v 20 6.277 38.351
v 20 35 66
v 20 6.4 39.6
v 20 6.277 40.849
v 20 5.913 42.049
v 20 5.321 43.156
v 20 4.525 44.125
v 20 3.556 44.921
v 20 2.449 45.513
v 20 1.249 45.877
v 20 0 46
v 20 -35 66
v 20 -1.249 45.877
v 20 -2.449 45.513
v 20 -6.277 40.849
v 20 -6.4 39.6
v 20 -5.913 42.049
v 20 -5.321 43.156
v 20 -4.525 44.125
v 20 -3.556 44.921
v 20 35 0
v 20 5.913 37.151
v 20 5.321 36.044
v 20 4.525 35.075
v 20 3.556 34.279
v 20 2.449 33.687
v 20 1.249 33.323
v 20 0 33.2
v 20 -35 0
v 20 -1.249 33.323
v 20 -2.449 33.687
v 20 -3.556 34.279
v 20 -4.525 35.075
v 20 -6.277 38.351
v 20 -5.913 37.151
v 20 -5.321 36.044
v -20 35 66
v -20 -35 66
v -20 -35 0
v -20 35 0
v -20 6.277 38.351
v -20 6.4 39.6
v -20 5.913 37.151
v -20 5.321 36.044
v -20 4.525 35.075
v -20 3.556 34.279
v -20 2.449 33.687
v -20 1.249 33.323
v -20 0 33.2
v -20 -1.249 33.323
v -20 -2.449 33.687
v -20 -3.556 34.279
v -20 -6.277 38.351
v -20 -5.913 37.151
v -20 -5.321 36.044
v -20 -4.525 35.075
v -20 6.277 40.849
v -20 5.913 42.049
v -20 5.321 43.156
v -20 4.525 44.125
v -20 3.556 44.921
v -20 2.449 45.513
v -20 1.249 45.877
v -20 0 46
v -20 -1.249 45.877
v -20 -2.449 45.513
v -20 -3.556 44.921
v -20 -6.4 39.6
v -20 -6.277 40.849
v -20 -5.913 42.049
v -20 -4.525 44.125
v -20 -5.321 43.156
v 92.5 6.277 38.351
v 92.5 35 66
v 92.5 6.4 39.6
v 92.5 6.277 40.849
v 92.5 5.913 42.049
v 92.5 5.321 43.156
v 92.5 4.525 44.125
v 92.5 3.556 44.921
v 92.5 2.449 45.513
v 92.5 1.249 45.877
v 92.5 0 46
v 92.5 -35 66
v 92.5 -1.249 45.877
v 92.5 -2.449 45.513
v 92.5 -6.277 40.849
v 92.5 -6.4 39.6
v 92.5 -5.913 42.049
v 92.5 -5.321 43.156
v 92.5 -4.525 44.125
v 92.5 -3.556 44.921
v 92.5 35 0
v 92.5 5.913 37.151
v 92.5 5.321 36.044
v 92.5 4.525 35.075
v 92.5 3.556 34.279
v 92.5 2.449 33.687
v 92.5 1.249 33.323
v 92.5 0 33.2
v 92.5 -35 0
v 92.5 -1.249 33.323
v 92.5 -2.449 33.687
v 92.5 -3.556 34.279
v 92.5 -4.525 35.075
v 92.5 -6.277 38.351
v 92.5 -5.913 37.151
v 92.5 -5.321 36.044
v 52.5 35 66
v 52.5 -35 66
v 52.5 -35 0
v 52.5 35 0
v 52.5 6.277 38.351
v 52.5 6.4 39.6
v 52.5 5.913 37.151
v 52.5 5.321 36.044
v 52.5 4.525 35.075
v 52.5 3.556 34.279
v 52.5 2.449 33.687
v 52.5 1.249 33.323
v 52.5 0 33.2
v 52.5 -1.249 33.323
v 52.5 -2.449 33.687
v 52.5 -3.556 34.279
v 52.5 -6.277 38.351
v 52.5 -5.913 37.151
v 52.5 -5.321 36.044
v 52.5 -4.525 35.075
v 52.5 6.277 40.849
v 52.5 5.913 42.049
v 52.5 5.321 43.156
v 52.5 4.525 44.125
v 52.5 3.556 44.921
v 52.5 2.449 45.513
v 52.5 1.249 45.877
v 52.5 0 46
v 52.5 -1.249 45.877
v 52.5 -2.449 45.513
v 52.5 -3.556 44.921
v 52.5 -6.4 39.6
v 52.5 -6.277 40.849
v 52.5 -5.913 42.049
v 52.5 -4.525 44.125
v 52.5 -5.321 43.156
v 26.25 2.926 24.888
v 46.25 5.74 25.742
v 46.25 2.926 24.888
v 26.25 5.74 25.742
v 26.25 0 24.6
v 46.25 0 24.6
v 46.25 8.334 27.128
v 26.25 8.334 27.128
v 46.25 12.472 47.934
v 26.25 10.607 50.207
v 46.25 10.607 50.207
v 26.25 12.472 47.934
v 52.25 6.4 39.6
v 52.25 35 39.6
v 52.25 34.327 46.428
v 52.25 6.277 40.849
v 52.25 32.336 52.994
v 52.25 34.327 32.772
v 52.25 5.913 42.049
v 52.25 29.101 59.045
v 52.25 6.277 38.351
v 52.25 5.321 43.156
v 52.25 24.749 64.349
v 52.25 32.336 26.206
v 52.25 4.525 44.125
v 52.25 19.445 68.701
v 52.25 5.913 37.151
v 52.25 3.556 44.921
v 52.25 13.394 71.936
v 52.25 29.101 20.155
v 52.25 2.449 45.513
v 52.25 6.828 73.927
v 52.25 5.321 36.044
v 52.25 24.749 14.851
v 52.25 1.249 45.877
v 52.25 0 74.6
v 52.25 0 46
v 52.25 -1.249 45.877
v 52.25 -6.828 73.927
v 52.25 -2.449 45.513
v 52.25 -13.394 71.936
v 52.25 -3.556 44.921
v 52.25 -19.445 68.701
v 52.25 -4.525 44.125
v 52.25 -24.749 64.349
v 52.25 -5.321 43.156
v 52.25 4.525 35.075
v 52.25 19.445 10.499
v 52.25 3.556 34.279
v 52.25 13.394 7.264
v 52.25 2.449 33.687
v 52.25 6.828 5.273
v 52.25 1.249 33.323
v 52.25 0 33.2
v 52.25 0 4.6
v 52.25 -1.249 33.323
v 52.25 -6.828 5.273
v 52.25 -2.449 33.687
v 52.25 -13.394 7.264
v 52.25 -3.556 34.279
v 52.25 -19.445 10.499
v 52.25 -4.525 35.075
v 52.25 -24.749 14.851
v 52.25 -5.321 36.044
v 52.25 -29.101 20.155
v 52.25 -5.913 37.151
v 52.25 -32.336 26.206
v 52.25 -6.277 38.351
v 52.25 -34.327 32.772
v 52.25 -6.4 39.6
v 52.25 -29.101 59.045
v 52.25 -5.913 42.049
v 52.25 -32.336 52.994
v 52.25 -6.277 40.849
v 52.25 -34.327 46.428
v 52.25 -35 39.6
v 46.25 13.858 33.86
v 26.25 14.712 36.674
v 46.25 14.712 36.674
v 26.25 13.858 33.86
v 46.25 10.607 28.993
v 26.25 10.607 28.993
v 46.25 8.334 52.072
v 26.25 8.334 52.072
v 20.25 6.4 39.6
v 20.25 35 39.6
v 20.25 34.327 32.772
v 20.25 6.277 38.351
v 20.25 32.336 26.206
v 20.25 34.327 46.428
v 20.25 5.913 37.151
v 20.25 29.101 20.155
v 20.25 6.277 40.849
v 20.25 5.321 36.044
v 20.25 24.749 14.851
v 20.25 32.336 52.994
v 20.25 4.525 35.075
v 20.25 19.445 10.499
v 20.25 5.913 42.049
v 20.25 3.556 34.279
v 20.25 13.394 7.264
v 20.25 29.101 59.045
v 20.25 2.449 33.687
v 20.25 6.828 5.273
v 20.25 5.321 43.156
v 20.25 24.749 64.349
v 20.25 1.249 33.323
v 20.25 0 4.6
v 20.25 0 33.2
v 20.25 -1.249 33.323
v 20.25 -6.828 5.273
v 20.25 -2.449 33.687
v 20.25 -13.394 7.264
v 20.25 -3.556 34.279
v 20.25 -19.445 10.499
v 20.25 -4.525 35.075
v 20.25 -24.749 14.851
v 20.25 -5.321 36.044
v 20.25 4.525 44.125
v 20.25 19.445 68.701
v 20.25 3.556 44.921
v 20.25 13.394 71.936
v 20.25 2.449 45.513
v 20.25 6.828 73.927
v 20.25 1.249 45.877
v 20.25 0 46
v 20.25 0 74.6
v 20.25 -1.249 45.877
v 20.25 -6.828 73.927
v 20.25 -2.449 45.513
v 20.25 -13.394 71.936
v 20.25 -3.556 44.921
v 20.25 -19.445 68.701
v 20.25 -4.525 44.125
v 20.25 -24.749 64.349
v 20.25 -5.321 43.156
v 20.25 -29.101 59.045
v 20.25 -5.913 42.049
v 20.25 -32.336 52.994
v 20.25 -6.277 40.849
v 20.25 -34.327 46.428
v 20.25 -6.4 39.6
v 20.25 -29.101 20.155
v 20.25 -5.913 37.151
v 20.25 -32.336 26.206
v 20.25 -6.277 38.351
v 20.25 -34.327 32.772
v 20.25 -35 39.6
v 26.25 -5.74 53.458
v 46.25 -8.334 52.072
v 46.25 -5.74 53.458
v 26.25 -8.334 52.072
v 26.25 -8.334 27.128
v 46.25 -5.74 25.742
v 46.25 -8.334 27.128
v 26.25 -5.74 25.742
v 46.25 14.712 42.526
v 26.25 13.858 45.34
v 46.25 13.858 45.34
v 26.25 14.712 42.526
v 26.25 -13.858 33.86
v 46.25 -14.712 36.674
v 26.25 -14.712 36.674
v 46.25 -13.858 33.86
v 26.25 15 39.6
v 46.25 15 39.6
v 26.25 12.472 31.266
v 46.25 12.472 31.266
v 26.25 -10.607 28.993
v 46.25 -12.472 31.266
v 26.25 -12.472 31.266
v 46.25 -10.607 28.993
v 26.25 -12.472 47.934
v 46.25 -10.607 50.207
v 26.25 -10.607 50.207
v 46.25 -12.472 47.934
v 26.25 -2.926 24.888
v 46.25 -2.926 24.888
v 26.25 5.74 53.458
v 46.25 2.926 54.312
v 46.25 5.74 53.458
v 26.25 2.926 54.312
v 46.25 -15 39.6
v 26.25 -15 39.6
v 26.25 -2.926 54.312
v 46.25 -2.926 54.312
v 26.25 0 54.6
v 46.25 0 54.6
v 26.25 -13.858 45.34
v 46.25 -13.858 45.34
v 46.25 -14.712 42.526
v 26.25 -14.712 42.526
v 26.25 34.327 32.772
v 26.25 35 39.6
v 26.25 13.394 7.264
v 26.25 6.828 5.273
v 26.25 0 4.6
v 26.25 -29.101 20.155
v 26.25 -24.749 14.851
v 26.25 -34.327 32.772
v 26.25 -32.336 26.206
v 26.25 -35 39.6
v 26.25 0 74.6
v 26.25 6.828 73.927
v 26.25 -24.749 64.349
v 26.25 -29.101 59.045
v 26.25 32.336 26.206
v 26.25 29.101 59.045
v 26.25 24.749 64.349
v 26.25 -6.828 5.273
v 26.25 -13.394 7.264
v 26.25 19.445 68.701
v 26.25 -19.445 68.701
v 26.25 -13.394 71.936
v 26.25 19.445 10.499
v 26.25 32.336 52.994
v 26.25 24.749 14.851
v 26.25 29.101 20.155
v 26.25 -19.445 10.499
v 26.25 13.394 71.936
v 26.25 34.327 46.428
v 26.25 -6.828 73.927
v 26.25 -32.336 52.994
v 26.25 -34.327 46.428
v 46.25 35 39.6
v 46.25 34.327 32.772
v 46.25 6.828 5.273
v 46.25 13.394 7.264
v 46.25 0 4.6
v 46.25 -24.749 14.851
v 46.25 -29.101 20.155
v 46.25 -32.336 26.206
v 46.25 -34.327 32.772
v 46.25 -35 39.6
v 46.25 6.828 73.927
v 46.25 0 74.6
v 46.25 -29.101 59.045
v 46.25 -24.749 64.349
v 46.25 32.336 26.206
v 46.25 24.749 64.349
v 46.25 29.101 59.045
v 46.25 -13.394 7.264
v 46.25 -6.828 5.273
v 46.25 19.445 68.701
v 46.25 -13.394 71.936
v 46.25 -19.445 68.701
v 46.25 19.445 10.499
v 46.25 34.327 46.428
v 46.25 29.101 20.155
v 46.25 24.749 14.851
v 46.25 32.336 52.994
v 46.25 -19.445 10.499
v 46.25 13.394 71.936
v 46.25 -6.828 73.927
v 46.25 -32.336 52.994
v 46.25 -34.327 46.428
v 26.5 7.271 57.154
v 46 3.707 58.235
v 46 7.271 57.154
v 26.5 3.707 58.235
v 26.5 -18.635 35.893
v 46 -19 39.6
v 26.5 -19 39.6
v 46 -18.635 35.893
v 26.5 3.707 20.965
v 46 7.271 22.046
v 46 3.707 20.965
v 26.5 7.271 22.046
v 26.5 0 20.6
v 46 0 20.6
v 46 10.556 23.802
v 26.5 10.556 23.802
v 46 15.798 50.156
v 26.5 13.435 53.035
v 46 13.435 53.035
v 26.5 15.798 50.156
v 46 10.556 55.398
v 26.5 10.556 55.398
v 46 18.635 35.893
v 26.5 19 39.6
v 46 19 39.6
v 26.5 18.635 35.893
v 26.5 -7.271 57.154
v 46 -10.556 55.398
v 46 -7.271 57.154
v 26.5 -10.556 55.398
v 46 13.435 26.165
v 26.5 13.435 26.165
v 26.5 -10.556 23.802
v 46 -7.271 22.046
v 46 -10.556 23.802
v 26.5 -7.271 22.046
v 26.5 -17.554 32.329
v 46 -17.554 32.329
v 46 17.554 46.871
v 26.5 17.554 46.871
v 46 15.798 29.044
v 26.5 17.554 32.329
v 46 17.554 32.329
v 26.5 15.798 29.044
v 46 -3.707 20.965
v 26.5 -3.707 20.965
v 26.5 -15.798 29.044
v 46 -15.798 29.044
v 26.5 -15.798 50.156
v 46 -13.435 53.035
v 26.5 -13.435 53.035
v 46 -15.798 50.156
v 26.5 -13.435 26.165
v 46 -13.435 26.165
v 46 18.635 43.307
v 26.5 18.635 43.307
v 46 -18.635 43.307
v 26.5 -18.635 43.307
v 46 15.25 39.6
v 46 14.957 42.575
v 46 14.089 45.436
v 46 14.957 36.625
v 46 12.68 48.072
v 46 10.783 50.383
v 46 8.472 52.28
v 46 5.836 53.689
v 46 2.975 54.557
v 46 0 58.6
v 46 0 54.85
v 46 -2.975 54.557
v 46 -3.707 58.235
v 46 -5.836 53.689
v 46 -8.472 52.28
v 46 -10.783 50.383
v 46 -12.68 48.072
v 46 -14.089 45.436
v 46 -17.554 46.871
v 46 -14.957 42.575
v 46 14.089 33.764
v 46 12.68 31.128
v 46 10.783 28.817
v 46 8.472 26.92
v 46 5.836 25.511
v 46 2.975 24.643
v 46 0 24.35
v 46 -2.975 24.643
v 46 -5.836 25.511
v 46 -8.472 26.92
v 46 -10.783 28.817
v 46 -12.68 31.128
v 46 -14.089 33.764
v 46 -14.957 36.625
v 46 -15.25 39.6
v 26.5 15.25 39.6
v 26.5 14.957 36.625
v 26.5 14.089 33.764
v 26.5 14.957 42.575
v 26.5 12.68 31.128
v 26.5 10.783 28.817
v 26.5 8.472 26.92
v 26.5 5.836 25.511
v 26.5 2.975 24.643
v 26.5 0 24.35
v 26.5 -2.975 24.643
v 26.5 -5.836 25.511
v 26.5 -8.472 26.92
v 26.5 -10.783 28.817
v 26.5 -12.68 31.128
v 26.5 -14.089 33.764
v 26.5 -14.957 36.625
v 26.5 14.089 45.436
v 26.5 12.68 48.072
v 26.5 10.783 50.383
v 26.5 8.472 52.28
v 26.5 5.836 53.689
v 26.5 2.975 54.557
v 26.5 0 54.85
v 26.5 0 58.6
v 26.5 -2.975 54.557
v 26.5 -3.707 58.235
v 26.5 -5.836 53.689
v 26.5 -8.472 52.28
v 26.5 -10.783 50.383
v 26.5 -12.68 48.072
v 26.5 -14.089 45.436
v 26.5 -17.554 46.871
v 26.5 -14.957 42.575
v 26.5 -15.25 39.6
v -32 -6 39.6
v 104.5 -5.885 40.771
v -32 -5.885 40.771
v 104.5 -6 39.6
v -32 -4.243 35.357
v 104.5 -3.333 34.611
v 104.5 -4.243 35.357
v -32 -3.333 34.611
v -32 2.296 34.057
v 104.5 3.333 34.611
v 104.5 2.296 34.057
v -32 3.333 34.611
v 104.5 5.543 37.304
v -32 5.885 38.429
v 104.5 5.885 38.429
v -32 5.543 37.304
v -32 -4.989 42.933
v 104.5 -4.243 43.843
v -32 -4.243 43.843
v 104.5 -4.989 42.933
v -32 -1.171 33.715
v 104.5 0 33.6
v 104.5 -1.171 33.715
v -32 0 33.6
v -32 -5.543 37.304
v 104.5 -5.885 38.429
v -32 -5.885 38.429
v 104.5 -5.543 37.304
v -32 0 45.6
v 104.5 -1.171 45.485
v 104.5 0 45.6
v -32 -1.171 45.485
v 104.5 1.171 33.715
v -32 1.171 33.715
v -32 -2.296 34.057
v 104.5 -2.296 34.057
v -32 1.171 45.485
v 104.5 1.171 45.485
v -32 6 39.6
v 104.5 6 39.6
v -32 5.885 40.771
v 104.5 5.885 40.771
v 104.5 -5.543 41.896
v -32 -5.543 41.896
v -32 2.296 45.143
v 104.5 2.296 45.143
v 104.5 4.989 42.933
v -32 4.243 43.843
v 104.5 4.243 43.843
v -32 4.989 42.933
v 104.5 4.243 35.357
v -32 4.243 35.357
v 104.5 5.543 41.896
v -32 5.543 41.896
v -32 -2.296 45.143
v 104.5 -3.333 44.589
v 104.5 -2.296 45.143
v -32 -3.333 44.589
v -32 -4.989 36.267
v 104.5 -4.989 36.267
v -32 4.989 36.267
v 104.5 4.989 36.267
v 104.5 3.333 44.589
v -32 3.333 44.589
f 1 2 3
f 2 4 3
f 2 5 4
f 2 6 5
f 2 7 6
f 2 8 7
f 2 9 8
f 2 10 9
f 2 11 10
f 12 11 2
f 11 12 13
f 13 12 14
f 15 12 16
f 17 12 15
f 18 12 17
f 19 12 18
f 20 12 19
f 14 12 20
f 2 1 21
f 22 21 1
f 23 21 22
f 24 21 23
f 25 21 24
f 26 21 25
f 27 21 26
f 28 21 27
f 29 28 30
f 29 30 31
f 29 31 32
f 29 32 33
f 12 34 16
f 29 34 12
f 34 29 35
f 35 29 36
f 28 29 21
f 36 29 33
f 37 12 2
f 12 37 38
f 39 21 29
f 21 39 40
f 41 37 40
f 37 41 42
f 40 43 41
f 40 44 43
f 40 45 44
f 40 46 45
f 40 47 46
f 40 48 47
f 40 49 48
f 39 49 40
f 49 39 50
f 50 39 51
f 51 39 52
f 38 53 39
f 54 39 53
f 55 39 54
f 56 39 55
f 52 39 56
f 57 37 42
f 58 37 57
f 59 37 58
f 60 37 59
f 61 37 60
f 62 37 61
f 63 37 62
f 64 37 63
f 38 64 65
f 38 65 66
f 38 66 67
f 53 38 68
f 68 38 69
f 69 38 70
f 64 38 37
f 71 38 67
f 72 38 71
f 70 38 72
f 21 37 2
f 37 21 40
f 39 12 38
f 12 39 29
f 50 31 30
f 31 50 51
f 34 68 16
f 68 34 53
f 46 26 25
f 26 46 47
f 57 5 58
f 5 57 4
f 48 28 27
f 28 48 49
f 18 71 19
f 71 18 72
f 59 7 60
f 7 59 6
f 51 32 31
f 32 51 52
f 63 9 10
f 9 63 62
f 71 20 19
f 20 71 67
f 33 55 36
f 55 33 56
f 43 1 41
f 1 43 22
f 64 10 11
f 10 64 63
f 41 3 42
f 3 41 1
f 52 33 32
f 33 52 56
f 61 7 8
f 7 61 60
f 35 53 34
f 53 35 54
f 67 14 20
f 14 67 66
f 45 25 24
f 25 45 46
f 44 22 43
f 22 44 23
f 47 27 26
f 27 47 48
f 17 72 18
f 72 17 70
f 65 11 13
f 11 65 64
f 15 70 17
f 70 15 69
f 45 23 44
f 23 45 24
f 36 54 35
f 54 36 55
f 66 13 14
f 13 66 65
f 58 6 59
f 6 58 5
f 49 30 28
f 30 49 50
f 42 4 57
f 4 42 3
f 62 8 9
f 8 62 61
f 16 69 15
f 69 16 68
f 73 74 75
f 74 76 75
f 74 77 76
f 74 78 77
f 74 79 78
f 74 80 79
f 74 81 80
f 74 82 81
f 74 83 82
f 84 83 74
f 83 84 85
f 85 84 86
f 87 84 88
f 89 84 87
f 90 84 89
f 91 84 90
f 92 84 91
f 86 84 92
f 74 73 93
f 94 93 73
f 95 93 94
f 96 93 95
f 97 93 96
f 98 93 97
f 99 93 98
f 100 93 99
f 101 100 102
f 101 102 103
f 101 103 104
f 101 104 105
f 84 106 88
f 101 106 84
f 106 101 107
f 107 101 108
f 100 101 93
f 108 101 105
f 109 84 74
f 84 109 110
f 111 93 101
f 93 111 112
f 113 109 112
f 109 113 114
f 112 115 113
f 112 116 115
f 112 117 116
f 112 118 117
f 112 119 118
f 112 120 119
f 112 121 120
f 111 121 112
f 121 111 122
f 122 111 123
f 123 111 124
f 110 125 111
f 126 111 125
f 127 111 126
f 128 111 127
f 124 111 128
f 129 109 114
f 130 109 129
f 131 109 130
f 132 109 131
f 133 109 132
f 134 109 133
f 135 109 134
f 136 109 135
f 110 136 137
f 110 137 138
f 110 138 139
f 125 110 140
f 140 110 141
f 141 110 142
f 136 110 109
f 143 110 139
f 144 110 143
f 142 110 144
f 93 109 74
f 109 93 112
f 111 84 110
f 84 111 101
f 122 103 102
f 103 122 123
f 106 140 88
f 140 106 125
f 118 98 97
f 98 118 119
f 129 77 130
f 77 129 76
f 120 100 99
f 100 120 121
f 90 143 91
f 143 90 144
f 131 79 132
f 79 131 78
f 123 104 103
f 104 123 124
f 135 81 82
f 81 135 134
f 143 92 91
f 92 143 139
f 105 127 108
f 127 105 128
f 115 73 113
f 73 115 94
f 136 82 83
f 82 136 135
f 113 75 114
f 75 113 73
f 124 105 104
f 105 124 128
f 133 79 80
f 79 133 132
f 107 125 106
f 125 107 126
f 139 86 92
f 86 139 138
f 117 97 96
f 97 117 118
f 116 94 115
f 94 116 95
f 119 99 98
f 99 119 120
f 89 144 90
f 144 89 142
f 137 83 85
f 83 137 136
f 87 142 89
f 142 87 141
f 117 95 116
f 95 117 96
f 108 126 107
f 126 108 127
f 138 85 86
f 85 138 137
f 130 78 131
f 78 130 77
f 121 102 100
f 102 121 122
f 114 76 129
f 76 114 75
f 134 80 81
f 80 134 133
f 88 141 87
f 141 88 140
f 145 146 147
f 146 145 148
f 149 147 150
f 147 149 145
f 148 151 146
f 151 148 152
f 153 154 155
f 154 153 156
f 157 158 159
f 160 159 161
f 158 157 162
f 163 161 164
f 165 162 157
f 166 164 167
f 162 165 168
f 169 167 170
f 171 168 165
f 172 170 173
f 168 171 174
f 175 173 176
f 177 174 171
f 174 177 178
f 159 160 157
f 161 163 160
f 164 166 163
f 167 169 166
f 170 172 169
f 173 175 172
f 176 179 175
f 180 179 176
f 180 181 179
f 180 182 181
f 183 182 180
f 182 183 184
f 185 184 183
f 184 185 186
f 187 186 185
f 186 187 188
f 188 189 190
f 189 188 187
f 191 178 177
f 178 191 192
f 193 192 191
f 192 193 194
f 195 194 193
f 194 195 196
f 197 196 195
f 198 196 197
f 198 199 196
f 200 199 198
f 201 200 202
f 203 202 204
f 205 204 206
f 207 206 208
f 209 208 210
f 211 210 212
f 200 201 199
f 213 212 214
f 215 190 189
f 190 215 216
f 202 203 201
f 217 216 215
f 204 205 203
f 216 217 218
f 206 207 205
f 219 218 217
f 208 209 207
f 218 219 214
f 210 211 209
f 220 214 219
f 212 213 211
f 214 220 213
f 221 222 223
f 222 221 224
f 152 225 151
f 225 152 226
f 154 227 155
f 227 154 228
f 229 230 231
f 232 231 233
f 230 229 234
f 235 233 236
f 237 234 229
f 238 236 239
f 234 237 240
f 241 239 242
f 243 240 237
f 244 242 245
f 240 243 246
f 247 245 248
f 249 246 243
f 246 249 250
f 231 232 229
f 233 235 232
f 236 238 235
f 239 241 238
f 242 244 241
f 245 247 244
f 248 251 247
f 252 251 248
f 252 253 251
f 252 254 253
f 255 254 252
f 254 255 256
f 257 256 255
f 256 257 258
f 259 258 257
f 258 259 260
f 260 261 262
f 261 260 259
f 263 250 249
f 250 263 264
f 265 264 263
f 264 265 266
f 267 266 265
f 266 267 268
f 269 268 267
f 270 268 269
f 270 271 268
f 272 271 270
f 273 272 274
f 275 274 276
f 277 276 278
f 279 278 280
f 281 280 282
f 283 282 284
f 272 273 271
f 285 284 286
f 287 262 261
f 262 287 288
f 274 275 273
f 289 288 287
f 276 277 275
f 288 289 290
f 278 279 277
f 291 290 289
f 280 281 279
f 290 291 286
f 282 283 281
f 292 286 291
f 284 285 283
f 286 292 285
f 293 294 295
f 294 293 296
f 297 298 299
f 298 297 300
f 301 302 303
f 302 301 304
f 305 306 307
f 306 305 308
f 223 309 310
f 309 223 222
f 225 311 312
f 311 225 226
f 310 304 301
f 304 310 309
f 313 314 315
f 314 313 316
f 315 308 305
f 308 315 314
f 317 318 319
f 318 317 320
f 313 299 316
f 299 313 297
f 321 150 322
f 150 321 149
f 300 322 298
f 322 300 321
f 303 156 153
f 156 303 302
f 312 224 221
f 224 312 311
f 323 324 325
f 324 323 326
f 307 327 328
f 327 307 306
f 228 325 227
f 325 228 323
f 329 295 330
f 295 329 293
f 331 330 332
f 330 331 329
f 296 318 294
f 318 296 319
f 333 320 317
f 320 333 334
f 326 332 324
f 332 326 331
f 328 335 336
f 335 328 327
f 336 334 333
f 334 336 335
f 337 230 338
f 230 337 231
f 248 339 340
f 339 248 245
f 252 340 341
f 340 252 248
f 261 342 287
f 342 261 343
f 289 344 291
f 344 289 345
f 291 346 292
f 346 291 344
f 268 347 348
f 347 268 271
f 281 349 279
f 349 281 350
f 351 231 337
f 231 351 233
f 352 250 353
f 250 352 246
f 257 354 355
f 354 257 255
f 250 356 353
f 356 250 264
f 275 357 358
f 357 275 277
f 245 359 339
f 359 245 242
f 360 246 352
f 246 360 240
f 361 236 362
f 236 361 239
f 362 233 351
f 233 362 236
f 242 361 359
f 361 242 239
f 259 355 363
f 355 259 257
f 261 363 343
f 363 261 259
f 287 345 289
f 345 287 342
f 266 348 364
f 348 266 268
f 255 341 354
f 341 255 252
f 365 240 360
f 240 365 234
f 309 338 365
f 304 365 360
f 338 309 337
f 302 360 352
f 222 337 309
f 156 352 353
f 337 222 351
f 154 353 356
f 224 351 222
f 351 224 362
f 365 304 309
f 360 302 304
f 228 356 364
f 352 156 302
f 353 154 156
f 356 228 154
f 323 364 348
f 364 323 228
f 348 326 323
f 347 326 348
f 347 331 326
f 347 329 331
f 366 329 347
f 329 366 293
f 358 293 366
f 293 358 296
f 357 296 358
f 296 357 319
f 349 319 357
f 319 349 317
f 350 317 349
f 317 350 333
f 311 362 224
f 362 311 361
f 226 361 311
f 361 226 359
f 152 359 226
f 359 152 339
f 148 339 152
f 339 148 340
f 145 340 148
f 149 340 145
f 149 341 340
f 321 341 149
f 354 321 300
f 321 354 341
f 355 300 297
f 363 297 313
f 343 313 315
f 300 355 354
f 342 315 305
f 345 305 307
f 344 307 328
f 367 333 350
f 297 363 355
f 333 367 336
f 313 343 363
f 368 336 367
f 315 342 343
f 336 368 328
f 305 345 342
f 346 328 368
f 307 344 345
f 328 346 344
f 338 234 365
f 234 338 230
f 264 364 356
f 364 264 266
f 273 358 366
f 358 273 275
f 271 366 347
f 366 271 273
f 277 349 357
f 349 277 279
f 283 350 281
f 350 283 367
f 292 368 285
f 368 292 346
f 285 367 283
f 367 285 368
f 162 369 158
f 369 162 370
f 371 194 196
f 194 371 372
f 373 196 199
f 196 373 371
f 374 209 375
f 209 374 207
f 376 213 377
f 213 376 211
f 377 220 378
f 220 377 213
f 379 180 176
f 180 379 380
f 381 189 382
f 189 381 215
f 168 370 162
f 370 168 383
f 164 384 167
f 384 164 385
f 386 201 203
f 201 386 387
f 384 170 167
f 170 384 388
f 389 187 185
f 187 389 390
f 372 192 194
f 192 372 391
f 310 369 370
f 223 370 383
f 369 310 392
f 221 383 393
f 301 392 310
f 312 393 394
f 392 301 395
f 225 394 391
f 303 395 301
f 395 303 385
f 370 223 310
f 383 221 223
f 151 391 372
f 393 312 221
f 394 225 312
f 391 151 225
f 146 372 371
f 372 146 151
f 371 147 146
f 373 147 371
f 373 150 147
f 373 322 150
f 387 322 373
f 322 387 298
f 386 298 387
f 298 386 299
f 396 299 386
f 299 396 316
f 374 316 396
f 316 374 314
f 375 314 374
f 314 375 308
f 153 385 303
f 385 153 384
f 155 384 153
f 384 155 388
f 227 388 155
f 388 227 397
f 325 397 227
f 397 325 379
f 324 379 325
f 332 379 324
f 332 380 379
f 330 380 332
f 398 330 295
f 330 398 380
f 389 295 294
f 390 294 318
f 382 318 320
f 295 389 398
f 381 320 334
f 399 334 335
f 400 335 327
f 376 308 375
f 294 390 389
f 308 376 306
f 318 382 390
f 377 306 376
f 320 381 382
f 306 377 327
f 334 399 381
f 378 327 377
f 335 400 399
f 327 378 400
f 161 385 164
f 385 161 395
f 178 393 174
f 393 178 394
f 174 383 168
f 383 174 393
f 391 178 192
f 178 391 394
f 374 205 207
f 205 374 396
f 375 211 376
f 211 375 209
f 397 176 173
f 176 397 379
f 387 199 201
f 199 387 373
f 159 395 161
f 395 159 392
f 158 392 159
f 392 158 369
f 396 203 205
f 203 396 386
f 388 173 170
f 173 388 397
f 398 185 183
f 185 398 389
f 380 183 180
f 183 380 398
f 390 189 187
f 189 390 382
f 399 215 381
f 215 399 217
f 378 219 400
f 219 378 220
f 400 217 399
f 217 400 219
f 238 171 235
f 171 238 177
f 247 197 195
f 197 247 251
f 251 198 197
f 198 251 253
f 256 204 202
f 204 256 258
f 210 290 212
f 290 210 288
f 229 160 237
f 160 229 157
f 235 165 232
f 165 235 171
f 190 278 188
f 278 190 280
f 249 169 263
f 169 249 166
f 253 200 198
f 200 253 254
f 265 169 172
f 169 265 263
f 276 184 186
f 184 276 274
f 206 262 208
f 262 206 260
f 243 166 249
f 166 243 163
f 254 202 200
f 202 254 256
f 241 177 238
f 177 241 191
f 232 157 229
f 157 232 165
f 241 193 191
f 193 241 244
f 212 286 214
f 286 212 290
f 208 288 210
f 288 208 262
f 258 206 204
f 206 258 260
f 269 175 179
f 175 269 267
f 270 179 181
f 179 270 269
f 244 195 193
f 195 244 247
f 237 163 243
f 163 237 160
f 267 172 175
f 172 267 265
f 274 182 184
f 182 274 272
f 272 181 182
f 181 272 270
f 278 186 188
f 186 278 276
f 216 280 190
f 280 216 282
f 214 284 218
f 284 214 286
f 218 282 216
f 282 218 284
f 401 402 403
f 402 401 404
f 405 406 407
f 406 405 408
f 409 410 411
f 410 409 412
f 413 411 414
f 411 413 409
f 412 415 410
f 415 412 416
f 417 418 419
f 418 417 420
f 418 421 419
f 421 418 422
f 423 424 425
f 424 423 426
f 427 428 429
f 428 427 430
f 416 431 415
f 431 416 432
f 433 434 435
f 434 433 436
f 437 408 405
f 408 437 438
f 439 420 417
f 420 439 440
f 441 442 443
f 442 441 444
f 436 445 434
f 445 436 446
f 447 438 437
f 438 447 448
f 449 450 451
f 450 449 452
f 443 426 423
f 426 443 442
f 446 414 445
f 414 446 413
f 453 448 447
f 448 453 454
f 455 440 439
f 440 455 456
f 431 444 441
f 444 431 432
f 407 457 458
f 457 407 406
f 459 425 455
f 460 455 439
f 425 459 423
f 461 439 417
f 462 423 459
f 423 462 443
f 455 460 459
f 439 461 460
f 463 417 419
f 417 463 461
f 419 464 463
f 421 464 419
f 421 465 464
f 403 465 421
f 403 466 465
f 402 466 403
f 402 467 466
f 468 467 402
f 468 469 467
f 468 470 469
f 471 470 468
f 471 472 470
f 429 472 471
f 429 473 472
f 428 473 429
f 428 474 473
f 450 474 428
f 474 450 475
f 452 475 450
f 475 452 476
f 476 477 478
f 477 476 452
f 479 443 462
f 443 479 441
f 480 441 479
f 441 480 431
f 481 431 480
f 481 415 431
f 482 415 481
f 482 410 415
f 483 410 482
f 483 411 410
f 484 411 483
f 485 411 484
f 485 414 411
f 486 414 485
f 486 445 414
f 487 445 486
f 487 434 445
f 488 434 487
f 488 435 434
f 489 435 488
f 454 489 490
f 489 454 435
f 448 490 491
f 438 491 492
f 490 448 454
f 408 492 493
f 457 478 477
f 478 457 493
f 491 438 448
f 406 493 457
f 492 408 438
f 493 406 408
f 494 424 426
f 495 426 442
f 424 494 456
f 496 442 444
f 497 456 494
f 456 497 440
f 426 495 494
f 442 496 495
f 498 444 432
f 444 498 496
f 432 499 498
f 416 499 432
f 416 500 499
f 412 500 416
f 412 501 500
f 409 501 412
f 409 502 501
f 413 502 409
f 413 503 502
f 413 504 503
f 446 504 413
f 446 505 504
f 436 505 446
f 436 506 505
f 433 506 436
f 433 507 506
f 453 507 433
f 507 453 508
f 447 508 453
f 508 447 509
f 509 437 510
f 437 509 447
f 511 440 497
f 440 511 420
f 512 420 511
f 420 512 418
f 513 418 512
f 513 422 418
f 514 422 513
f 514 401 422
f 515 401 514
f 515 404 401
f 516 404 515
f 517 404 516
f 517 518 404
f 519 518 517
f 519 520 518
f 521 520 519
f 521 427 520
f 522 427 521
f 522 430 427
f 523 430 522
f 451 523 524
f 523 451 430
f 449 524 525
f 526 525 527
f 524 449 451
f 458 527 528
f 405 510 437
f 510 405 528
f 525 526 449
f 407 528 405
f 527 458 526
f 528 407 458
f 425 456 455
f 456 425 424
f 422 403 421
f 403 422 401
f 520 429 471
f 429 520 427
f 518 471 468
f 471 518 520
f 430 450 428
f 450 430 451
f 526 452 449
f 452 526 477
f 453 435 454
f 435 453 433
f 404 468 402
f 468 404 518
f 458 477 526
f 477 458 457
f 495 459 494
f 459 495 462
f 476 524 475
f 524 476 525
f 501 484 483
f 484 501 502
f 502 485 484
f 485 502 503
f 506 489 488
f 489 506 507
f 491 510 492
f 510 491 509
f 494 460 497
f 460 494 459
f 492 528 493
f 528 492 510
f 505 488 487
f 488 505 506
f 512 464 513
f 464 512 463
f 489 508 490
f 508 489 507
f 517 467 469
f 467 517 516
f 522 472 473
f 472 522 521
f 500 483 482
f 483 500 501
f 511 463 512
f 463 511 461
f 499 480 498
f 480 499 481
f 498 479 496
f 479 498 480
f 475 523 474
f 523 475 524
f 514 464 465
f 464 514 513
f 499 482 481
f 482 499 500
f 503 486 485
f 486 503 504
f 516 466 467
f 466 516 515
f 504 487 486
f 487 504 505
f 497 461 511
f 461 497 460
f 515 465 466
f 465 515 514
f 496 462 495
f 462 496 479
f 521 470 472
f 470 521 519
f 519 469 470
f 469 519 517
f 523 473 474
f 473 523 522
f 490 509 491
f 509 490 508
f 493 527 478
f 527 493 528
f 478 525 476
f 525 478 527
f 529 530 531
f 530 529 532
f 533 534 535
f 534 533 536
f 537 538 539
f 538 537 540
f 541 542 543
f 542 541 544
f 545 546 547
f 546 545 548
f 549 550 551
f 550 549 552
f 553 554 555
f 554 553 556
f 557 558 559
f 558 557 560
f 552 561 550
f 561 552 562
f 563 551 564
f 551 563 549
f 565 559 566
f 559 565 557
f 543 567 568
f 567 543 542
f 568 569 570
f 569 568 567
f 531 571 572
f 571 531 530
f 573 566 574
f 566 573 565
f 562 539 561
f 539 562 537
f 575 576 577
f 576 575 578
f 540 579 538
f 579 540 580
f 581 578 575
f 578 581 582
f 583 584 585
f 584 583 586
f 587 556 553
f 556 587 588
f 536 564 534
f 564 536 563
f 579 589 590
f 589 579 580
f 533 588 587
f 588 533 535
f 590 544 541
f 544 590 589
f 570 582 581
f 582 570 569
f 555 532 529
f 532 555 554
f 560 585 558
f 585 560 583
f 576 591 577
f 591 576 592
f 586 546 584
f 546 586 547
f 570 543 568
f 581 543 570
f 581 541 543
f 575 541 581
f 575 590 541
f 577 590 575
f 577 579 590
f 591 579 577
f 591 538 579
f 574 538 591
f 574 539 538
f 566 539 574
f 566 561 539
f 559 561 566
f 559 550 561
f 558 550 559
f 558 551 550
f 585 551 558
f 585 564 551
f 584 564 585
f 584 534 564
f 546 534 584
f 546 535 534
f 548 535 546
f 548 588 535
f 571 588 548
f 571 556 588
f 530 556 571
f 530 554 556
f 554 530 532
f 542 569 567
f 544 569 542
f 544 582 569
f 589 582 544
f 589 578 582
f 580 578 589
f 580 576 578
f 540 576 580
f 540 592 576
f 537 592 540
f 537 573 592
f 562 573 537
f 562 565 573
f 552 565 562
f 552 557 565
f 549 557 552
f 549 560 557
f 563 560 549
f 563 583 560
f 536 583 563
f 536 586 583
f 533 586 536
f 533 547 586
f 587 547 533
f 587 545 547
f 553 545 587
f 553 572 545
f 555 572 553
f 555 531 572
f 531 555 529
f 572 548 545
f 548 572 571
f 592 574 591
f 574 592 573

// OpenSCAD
$fn = 32;

// ------------------------------------------------------------------------
// Pulley assembly: d70 pulley with a belt, shaft d12
// Every part is its own module, assembly() places them once.
// ------------------------------------------------------------------------

// --- part 1 ---
module support1() {
  difference() {
    translate([-20, -35, 0]) cube([40, 70, 66]);
    translate([0, 0, 39.6]) rotate([0, 90, 0]) cylinder(h = 42, d = 12.8, center = true);
  }
}

// --- part 2 ---
module support2() {
  difference() {
    translate([-20, -35, 0]) cube([40, 70, 66]);
    translate([0, 0, 39.6]) rotate([0, 90, 0]) cylinder(h = 42, d = 12.8, center = true);
  }
}

// --- part 3 ---
module shaft() {
  translate([0, 0, -68.25]) cylinder(h = 136.5, d = 12);
}

// --- part 4 ---
module pulley() {
  difference() {
    union() {
      cylinder(h = 32, d = 30);
      cylinder(h = 6, d = 70);
      translate([0, 0, 26]) cylinder(h = 6, d = 70);
    }
    translate([0, 0, -1]) cylinder(h = 34, d = 12.8);
  }
}

// --- part 5 ---
module belt() {
  difference() {
      translate([0, 0, 0]) cylinder(h = 19.5, d = 38);
      translate([0, 0, -1]) cylinder(h = 21.5, d = 30.5);
    }
}

// --- assembly ---
module assembly() {
  translate([0, 0, 0]) rotate([0, 0, 0]) support1();
  translate([72.5, 0, 0]) rotate([0, 0, 0]) support2();
  translate([36.25, 0, 39.6]) rotate([0, 90, 0]) shaft();
  translate([20.25, 0, 39.6]) rotate([0, 90, 0]) pulley();
  translate([26.5, 0, 39.6]) rotate([0, 90, 0]) belt();
}

assembly();
